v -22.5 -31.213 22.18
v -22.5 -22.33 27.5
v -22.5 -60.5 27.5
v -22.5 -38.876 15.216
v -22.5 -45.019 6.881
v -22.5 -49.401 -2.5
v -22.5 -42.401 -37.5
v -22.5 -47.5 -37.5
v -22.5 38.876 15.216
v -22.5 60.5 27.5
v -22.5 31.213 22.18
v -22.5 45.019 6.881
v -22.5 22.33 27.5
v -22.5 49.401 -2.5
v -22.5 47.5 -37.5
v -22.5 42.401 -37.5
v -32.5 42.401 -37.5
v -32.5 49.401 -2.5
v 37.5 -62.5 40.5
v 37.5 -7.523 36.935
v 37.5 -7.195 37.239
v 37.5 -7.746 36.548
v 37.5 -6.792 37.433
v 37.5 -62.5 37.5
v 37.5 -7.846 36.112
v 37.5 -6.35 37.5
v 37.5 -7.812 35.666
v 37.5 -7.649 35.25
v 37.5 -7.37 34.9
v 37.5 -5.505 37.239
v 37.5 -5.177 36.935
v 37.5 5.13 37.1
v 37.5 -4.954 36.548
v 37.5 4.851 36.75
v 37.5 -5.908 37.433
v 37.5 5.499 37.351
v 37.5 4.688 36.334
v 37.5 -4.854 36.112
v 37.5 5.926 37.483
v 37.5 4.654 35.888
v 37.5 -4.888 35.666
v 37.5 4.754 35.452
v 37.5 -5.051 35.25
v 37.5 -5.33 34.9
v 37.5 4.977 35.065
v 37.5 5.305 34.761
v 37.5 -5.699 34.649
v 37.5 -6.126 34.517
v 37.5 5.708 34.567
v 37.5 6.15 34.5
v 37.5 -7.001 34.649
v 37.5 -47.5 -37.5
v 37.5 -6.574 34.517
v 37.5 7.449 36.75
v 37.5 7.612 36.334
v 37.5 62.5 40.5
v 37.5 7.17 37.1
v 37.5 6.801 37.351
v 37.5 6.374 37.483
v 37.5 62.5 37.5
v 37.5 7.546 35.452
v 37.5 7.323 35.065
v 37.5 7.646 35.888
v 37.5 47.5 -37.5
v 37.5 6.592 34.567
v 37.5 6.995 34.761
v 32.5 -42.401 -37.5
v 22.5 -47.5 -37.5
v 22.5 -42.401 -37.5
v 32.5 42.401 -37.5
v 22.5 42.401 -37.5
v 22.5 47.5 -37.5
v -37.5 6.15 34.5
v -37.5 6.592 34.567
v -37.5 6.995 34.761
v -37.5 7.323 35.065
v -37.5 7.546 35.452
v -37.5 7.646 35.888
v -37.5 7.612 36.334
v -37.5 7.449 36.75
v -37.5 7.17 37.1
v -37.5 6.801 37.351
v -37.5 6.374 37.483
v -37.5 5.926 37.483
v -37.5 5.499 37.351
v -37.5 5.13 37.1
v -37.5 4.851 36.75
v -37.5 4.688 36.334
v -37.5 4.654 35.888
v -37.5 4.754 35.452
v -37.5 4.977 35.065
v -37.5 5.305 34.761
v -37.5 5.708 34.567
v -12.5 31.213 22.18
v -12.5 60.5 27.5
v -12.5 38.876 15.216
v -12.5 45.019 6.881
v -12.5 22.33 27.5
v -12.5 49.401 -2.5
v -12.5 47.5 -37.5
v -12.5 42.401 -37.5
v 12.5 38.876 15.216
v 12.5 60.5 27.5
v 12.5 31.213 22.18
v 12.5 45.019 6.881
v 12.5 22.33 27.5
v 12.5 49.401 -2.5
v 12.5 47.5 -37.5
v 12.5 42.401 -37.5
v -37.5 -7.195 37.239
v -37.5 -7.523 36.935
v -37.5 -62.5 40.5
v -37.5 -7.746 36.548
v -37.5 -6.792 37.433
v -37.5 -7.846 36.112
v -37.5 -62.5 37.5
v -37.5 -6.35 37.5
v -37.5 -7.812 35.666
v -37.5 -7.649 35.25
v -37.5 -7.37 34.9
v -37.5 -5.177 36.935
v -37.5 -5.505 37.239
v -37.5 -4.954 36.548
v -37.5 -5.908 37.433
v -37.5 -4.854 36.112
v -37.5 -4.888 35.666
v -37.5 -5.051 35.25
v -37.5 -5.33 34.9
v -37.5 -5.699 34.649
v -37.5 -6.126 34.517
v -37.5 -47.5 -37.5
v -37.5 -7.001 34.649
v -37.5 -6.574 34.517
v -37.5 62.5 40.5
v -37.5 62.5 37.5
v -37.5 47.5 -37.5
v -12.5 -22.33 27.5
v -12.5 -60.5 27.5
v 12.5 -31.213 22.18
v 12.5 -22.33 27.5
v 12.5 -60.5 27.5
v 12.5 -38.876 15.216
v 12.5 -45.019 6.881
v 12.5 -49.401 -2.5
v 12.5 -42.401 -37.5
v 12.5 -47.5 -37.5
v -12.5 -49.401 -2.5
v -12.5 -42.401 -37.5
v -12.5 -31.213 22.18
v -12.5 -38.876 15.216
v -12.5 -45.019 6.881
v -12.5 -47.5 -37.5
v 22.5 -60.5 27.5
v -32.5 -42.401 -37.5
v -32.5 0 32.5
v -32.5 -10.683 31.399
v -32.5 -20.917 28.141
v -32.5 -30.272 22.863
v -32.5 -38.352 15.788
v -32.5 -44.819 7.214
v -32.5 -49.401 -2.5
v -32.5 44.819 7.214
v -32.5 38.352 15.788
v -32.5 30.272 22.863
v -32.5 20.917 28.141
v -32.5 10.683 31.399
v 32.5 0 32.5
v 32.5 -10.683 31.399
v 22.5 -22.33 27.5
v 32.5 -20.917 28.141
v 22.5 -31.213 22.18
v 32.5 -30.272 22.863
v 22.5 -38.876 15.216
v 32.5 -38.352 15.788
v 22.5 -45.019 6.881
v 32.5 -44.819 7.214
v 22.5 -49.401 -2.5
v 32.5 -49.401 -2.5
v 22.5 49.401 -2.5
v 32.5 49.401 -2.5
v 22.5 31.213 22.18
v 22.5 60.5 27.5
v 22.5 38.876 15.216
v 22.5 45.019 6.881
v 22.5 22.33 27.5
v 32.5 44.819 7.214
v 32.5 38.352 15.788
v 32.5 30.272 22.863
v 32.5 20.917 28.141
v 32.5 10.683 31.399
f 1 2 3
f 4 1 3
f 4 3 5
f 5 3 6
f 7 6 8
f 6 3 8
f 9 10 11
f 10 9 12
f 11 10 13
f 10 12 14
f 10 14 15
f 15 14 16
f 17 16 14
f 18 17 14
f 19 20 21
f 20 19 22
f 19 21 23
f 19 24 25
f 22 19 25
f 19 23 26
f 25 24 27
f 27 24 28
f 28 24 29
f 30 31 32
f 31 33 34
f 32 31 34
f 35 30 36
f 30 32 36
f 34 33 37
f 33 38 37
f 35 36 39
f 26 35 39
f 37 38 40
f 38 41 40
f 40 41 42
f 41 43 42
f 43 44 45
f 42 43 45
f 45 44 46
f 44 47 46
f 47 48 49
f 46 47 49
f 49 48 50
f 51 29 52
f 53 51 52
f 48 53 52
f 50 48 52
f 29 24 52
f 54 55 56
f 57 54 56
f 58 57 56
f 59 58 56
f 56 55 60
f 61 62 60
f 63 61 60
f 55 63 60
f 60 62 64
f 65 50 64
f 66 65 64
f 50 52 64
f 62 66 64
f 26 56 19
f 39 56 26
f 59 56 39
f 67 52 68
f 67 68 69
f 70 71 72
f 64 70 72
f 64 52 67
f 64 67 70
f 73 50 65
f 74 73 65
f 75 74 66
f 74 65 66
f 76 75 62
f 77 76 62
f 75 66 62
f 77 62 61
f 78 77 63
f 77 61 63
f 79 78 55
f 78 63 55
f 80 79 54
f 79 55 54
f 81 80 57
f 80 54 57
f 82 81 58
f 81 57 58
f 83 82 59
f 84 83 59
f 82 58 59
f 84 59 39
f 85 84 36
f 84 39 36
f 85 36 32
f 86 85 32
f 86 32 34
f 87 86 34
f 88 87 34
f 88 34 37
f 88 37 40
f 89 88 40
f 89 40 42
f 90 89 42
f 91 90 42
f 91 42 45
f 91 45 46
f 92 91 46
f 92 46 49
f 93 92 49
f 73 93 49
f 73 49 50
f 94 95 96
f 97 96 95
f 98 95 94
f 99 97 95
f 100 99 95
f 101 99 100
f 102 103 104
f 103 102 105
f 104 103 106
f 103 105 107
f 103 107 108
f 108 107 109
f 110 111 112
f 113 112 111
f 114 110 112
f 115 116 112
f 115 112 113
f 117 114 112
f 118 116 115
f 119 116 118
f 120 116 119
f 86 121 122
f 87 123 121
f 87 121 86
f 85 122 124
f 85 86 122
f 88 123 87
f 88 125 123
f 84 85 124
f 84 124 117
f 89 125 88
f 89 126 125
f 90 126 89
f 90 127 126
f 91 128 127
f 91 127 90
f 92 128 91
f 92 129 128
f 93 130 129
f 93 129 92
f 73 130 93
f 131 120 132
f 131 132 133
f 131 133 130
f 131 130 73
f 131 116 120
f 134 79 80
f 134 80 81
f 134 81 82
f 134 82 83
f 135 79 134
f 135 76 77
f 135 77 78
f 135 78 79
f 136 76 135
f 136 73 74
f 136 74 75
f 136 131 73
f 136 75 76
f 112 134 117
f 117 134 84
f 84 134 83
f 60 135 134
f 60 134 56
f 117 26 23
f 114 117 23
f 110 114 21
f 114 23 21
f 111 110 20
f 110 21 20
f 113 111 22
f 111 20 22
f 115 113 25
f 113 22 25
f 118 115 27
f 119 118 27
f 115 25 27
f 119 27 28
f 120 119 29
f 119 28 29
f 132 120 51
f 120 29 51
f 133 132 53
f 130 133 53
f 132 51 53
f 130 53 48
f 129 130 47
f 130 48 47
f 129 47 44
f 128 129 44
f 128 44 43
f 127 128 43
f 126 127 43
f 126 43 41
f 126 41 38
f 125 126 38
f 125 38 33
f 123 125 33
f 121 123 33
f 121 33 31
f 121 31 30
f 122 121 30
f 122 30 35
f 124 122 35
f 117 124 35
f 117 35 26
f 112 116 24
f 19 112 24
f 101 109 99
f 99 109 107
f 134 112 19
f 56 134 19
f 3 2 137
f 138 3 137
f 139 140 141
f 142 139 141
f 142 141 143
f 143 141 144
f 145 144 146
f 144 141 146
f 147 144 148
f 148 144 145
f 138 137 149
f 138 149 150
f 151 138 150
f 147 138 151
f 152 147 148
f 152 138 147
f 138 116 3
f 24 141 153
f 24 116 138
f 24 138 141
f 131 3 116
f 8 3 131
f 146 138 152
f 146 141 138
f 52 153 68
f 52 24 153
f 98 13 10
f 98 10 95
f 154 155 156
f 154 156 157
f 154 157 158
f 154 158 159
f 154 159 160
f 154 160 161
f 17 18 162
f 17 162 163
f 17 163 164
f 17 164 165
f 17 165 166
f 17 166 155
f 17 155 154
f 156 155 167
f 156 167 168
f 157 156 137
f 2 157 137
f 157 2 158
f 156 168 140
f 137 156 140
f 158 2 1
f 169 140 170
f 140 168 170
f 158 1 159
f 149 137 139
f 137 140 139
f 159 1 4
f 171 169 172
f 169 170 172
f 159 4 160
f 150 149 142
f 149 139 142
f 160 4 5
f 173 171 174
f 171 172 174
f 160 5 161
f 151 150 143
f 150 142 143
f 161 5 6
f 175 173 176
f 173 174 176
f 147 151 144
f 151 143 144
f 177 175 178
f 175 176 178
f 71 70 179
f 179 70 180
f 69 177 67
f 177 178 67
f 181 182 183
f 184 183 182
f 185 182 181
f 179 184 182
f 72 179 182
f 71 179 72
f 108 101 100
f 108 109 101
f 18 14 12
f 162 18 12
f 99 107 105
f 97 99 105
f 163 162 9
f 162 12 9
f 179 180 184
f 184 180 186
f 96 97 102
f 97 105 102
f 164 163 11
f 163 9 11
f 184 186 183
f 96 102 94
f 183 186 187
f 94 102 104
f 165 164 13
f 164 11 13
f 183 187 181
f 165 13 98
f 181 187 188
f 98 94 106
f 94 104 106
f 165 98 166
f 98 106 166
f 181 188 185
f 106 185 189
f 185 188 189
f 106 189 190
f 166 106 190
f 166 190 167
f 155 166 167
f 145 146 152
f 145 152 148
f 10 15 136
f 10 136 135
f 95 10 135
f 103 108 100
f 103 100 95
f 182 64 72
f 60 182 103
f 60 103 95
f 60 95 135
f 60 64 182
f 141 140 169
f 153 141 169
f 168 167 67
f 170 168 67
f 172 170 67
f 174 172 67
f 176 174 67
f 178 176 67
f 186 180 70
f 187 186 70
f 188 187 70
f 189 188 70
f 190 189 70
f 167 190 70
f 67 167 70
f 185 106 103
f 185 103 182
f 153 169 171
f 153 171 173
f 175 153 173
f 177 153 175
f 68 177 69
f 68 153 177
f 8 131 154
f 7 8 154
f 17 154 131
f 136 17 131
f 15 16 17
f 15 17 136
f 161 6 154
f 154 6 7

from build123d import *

# Parameters (mm, degrees)
BOSS_EXTRUDE1_DEPTH     = 37.5
SHELL1_T                = -5
BOSS_EXTRUDE4_DEPTH     = 65
CUT_EXTRUDE4_DEPTH      = 82.967981554
CUT_EXTRUDE4_DEPTH_BACK = 82.967981554
SKETCH11_W              = 10
SKETCH11_H              = 65
SKETCH13_W              = 75
SKETCH13_H              = 125
BOSS_EXTRUDE5_DEPTH     = 3
SKETCH12_R              = 1.5
CUT_EXTRUDE5_DEPTH      = 106.695316831


with BuildPart() as part:
    # Sketch1 → Boss-Extrude1 (new, symmetric)
    with BuildSketch(Plane(origin=(0, 0, 0), x_dir=(0, 0, -1), z_dir=(1, 0, 0))):
        Polygon((-37.5, 32.5), (-37.5, -52.5), (-37.5, -62.5), (37.5, -47.5), (37.5, -37.5), (37.5, -32.5), (37.5, 32.5), (37.5, 47.5), (-37.5, 62.5), (-37.5, 47.5), align=None)
    extrude(amount=BOSS_EXTRUDE1_DEPTH, both=True)

    # Shell1
    shell1_openings = [part.faces().sort_by_distance(p)[0] for p in [
        (0, 0, -37.5),
    ]]
    offset(amount=SHELL1_T, openings=shell1_openings, kind=Kind.INTERSECTION)

    # Sketch10 → Boss-Extrude4 (add)
    with BuildSketch(Plane.ZY.offset(-32.5)):
        with BuildLine():
            Line((-2.5, -49.400980486), (32.5, -56.400980486))
            Line((32.5, -56.400980486), (32.5, 0))
            ThreePointArc((32.5, 0), (22.863250205, -30.271508358), (-2.5, -49.400980486))
        make_face()
        with BuildLine():
            ThreePointArc((-2.5, 49.400980486), (22.863250205, 30.271508358), (32.5, 0))
            Line((32.5, 0), (32.5, 56.400980486))
            Line((32.5, 56.400980486), (-2.5, 49.400980486))
        make_face()
    extrude(amount=BOSS_EXTRUDE4_DEPTH)

    # Sketch11 → Cut-Extrude4 (cut, two sides: drawn at the far end of the back side and taken through both)
    with BuildSketch(Plane(origin=(0, 0, 0), x_dir=(1, 0, 0), z_dir=(0, 1, 0)).offset(-CUT_EXTRUDE4_DEPTH_BACK)):
        with Locations((-17.5, 5)):
            Rectangle(SKETCH11_W, SKETCH11_H)
        with Locations((17.5, 5)):
            Rectangle(SKETCH11_W, SKETCH11_H)
    extrude(amount=CUT_EXTRUDE4_DEPTH + CUT_EXTRUDE4_DEPTH_BACK, mode=Mode.SUBTRACT)

    # Sketch13 → Boss-Extrude5 (add)
    with BuildSketch(Plane.XY.offset(37.5)):
        Rectangle(SKETCH13_W, SKETCH13_H)
    extrude(amount=BOSS_EXTRUDE5_DEPTH)

    # Sketch12 → Cut-Extrude5 (cut, through all)
    with BuildSketch(Plane(origin=(37.5, 0, 0), x_dir=(0, 0, -1), z_dir=(1, 0, 0))):
        with Locations((-36, 6.15)):
            Circle(SKETCH12_R)
        with Locations(Location((-36, -6.35, 0), (0, 0, 180))):
            Circle(SKETCH12_R)
    extrude(amount=-CUT_EXTRUDE5_DEPTH, mode=Mode.SUBTRACT)


solid = part.part
